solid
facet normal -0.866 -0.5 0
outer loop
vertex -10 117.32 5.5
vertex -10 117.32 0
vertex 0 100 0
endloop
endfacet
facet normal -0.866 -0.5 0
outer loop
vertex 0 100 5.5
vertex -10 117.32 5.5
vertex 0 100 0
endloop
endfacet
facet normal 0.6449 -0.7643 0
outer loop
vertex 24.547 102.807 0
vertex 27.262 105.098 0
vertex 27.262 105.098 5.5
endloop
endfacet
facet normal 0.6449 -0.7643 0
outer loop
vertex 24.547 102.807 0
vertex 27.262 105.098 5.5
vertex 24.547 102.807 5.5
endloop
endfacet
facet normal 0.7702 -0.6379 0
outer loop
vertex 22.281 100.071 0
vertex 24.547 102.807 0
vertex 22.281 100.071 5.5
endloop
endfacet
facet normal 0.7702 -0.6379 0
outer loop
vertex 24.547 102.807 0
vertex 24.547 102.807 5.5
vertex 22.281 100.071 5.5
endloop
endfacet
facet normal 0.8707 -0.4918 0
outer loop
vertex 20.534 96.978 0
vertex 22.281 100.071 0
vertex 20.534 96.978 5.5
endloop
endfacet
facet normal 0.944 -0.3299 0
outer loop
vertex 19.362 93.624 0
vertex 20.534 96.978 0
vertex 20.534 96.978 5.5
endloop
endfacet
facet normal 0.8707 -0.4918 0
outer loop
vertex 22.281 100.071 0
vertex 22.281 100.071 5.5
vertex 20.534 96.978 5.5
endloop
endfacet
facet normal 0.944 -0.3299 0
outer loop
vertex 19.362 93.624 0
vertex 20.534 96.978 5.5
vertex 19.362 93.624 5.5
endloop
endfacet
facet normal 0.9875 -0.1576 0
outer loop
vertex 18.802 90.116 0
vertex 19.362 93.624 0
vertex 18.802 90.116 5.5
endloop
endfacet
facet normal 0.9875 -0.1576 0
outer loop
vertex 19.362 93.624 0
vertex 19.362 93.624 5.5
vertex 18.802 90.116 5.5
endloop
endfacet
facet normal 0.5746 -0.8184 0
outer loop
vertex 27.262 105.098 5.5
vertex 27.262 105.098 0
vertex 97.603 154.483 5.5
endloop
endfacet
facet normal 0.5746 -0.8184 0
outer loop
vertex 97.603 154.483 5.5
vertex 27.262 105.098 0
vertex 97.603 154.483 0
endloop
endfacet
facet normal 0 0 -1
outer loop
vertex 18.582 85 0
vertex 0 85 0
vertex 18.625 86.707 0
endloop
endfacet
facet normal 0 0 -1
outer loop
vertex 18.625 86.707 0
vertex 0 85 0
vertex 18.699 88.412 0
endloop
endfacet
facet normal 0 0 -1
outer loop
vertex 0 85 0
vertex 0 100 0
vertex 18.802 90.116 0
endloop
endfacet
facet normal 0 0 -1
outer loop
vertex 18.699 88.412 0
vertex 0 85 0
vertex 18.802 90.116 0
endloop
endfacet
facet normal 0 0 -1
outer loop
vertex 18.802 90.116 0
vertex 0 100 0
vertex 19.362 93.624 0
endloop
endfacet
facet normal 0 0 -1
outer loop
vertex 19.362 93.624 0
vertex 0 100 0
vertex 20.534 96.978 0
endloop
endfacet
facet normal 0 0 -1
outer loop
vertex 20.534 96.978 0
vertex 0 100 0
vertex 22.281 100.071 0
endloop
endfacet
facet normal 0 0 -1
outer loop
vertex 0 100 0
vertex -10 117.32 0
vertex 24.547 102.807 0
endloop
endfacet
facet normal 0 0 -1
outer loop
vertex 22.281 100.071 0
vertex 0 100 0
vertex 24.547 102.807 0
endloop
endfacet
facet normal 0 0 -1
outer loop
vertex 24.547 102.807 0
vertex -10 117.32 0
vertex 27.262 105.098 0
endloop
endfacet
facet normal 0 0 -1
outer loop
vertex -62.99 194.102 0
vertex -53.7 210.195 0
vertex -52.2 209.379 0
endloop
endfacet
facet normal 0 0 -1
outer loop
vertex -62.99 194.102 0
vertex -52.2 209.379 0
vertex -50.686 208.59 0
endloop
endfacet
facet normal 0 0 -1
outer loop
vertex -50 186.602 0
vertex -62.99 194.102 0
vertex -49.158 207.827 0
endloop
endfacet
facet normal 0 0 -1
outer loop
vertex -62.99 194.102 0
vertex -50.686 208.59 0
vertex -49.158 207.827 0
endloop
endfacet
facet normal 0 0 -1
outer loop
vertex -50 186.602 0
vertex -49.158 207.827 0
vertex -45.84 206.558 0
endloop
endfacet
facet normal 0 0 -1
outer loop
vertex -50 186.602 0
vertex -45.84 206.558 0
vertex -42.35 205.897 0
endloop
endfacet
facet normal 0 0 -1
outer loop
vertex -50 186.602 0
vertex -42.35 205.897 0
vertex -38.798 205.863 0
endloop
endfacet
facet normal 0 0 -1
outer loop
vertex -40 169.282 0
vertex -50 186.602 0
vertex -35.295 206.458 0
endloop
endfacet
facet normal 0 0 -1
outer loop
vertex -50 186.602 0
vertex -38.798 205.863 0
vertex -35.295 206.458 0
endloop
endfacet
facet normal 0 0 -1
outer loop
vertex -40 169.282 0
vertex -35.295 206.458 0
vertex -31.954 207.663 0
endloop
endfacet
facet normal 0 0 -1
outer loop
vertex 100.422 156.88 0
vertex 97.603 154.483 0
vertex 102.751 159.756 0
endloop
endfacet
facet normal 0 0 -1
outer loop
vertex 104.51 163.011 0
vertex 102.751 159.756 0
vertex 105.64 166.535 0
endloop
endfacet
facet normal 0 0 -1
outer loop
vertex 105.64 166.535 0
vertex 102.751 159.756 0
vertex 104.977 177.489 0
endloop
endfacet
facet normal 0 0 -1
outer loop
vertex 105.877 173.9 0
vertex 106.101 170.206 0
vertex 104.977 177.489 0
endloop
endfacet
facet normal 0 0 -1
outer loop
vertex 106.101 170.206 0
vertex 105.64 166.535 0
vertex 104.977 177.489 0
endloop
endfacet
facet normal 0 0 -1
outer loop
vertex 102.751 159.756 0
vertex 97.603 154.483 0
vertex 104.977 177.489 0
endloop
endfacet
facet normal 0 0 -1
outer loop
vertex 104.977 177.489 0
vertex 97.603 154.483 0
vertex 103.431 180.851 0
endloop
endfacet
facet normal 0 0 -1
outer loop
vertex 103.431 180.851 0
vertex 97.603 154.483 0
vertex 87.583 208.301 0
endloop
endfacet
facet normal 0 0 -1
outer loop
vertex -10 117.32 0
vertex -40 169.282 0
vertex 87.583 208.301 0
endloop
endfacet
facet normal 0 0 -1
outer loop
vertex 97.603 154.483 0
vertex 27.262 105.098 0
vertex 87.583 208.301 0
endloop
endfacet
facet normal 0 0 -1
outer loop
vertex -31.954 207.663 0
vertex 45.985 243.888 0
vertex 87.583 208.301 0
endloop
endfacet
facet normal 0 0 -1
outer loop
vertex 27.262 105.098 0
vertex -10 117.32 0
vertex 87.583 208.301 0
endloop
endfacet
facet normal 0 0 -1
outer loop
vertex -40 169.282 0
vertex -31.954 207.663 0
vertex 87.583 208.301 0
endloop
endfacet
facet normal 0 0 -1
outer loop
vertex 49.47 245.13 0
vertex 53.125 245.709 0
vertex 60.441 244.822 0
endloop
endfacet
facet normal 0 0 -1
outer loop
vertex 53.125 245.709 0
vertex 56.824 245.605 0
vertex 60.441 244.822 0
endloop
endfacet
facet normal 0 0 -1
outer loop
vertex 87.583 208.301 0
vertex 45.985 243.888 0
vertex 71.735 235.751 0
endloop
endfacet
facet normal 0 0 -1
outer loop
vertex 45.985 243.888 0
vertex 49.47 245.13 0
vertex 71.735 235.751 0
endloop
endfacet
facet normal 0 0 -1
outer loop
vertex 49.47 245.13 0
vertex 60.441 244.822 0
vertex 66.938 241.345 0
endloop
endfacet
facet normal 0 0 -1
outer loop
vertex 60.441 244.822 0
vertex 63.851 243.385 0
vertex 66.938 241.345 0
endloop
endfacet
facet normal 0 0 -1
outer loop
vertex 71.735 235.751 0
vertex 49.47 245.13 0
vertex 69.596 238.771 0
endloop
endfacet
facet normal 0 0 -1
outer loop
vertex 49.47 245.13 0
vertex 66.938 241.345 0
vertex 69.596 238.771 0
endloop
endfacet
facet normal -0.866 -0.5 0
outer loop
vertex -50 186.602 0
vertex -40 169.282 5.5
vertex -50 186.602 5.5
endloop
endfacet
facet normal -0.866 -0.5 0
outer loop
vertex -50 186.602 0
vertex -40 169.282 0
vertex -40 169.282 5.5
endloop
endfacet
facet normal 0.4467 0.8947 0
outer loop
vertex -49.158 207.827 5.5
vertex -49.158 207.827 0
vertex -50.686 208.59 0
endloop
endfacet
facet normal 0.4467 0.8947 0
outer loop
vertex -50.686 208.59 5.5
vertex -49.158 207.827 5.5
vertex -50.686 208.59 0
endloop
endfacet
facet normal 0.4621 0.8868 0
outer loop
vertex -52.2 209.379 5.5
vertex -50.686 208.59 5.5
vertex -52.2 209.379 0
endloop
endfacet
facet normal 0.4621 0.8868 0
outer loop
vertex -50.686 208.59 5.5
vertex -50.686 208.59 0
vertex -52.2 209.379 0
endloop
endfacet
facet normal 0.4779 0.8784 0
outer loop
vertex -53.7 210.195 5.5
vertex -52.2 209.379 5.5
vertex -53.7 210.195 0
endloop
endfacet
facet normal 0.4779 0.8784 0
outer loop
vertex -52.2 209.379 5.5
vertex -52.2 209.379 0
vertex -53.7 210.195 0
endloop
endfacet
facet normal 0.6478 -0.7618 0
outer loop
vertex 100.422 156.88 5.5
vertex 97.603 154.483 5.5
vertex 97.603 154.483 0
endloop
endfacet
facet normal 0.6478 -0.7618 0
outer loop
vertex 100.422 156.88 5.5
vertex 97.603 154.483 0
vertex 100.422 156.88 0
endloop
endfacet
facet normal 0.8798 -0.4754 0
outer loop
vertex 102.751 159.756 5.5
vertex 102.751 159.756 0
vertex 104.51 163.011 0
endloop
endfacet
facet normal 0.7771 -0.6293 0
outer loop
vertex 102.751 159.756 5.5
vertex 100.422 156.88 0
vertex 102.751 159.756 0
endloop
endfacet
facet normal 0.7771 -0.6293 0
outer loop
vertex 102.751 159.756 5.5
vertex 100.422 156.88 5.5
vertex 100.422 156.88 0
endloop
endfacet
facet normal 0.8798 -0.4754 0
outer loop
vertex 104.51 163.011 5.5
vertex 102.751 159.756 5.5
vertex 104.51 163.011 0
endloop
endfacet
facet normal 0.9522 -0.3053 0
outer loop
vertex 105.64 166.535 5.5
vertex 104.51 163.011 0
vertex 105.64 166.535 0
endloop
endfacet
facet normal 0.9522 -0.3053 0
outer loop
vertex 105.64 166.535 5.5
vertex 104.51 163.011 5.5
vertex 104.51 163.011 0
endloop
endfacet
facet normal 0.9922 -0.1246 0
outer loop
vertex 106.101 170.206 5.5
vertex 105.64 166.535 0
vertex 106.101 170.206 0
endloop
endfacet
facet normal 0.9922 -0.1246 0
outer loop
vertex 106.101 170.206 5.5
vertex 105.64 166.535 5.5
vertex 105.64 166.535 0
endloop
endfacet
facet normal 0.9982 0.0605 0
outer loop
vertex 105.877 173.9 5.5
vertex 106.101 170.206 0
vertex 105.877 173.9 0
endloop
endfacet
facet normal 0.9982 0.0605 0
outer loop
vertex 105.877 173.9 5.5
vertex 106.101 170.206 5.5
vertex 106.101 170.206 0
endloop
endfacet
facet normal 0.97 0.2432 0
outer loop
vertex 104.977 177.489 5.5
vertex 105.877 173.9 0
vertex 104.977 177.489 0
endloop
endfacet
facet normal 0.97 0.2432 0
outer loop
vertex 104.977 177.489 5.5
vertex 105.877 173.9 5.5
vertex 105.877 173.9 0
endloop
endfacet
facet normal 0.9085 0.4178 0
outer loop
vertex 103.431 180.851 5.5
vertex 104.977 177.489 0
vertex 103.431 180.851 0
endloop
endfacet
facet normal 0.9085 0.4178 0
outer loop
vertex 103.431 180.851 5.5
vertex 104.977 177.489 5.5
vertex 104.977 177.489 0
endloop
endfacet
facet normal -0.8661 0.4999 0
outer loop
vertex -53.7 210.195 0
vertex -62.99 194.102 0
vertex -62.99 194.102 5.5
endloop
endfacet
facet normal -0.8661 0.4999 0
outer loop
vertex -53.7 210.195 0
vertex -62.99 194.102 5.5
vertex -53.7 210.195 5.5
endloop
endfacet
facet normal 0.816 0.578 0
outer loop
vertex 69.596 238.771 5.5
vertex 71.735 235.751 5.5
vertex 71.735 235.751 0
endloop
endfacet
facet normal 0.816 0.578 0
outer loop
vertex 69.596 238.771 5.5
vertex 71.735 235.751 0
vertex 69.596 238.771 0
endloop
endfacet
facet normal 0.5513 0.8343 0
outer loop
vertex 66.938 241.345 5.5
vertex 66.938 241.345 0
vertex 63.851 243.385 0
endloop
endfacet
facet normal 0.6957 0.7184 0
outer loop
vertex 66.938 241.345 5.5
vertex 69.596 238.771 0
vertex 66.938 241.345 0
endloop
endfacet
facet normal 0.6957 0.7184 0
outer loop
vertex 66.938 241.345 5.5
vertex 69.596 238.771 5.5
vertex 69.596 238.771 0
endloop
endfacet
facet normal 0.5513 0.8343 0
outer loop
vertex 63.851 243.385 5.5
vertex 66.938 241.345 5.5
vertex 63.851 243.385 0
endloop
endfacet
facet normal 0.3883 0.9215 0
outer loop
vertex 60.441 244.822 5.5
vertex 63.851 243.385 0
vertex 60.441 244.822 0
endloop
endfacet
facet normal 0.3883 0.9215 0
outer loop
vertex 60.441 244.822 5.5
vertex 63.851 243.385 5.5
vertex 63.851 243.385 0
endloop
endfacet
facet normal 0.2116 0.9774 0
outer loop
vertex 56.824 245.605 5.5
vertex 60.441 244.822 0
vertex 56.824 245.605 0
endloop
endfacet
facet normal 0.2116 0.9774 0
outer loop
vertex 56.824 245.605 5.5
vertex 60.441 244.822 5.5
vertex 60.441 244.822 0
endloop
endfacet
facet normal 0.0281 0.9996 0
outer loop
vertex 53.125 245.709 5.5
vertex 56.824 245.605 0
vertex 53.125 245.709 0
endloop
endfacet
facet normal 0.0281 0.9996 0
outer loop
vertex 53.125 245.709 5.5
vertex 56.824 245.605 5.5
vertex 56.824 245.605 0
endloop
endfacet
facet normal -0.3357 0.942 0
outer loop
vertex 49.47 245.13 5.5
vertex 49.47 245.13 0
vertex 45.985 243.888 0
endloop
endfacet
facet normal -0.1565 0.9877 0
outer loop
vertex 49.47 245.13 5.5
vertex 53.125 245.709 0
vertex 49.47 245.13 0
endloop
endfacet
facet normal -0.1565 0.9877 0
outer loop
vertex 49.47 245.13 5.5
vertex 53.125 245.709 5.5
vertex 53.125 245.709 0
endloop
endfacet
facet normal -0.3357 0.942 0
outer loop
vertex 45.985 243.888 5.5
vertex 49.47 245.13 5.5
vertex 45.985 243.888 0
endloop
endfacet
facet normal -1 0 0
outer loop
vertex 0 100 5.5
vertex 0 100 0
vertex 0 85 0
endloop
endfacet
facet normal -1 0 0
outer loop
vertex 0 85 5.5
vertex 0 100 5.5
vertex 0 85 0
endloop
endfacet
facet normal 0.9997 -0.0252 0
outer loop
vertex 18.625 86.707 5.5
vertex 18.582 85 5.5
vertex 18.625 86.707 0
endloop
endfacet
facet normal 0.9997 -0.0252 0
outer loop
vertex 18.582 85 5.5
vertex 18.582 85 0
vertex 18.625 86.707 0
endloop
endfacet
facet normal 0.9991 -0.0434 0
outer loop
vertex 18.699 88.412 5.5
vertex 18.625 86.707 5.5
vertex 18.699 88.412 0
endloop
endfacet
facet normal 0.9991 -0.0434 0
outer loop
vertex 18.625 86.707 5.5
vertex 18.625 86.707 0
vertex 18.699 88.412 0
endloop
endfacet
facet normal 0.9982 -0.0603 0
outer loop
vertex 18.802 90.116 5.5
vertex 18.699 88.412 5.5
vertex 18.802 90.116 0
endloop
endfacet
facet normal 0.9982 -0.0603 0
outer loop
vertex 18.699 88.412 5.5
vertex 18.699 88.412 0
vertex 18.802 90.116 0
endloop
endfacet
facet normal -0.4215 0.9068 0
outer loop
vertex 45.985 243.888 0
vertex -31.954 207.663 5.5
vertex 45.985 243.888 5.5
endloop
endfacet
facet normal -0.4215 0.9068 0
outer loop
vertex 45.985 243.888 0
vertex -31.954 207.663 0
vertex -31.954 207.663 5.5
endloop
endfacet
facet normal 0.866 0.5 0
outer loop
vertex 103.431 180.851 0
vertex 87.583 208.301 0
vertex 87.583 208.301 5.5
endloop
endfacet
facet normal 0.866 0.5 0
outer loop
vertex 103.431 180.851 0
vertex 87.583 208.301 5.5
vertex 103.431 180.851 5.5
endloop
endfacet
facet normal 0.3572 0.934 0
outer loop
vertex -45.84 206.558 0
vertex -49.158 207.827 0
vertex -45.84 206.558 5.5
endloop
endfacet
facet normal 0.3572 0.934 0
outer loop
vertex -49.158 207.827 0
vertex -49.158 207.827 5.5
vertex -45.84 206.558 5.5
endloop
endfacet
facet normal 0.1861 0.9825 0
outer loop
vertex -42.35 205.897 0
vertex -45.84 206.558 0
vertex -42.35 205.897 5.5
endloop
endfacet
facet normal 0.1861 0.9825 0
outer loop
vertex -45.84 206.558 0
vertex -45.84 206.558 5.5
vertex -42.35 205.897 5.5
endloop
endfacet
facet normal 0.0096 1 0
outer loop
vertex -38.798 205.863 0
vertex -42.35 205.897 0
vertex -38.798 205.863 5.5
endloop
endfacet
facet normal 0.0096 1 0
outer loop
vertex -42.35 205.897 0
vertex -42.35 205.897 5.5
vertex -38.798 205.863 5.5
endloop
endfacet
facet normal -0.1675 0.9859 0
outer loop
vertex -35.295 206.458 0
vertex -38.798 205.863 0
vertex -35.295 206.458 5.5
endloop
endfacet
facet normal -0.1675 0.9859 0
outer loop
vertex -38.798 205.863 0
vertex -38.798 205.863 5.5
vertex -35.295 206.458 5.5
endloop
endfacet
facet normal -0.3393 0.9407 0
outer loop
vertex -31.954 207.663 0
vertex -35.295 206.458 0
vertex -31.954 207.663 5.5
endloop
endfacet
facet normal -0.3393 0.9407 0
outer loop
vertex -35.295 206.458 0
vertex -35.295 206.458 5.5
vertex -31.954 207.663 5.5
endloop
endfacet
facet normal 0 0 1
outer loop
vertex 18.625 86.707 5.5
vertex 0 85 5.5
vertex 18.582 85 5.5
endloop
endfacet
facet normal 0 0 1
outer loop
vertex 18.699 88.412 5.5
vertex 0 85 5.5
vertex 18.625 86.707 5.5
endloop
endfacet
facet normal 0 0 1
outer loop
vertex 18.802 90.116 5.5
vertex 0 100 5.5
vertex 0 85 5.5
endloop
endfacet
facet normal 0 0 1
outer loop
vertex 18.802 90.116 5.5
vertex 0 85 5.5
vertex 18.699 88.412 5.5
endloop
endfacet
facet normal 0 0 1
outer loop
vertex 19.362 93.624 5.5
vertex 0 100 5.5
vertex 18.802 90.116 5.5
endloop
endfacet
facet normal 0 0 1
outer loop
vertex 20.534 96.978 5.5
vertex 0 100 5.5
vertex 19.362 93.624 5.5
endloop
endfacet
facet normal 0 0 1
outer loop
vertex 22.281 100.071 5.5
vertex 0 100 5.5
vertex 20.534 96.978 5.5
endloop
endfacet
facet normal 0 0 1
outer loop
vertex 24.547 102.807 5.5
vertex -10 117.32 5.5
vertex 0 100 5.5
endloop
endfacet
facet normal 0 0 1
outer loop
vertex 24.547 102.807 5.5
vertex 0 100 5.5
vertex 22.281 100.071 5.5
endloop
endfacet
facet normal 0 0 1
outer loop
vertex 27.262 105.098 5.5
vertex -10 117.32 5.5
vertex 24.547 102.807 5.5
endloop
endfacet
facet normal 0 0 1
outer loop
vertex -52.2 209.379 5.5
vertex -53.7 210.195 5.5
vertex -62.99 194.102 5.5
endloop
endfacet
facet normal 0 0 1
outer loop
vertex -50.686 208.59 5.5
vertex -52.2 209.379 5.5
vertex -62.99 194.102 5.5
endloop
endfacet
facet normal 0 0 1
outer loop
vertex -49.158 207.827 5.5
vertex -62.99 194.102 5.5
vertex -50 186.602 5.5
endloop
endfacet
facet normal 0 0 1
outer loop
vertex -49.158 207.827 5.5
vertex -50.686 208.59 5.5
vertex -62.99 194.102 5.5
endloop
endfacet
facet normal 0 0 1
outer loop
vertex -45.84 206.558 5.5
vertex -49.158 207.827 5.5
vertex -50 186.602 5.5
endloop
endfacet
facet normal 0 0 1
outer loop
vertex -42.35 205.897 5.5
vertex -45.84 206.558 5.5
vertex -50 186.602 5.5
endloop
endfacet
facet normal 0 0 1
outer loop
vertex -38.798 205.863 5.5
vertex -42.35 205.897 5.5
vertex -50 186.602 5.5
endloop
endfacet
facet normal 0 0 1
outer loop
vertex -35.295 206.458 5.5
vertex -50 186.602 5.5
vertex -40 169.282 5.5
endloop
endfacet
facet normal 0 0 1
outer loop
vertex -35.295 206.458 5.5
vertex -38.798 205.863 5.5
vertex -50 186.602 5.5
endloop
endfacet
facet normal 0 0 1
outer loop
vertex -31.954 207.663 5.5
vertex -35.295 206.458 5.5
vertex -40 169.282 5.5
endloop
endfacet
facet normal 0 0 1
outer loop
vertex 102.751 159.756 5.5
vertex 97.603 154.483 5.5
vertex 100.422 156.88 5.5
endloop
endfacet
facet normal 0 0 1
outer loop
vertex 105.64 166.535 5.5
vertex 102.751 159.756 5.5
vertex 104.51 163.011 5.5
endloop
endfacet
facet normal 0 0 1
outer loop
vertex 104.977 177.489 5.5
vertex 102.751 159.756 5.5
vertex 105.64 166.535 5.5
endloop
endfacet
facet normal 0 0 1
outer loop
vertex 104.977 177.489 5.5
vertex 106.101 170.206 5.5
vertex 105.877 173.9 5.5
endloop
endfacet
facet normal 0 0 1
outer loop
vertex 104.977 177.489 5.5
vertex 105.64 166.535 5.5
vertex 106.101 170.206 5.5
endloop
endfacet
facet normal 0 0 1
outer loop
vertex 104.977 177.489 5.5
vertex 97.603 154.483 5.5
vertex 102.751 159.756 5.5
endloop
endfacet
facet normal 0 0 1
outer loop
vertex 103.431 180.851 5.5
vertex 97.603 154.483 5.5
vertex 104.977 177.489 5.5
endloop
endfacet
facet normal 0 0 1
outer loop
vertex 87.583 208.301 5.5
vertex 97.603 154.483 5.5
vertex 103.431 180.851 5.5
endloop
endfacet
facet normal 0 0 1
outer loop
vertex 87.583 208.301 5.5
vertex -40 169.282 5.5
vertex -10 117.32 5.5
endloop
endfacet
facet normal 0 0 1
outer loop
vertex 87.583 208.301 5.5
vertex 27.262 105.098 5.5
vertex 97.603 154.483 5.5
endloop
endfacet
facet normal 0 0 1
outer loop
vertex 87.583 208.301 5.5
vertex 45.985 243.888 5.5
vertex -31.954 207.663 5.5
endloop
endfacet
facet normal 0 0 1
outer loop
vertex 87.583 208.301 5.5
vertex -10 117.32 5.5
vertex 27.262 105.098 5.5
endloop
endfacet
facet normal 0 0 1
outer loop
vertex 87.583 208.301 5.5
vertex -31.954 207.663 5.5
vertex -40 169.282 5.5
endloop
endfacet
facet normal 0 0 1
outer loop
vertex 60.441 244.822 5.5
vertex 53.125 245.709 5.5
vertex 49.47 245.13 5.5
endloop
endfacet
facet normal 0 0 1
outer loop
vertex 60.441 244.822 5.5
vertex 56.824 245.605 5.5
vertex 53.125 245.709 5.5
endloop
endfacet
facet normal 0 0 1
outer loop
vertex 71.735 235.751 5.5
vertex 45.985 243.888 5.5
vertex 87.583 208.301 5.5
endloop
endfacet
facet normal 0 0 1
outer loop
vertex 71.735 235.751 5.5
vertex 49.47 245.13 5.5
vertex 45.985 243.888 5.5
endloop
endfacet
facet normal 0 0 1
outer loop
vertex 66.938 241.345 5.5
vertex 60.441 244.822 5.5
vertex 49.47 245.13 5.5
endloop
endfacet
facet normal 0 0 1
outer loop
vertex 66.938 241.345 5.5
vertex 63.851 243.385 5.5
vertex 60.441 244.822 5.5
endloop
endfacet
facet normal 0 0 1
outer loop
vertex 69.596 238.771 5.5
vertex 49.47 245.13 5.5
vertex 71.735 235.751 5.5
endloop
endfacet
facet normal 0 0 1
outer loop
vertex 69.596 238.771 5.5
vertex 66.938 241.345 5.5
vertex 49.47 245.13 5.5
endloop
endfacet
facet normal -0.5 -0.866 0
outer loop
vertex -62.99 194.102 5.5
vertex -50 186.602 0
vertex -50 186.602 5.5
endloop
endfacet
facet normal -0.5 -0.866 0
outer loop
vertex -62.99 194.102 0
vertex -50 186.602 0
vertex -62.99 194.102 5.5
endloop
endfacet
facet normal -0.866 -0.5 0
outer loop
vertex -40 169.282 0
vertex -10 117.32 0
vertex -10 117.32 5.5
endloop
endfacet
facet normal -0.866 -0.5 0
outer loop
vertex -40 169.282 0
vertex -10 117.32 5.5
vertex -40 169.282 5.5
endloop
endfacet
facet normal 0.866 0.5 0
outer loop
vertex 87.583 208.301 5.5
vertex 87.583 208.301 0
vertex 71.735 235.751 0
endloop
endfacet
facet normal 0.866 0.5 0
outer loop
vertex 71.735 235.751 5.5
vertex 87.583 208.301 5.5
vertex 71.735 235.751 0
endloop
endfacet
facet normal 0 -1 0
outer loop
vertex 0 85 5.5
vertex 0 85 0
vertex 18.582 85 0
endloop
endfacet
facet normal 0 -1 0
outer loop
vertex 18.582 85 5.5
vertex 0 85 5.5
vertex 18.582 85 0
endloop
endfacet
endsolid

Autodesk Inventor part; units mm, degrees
ref_plane "YZ Plane" through (0, 0, 0) normal (1, 0, 0) x (0, 1, 0)
ref_plane "XZ Plane" through (0, 0, 0) normal (0, 1, 0) x (-1, 0, 0)
ref_plane "XY Plane" through (0, 0, 0) normal (0, 0, 1) x (1, 0, 0)
sketch "Sketch1" plane through (0, 0, 0) normal (0, 0, 1) x (1, 0, 0)
  arc A0 (20, 100) -> (18.5818, 85) centre (115.8042, 83.3748) ccw
  arc A1 (-53.6995, 210.1948) -> (-40, 203.923) centre (-6.4957, 295.2045) ccw
  line L0 (-10, 117.3205) -> (0, 100)
  line L1 (-40, 169.282) -> (-50, 186.6025)
  line L2 (0, 100) -> (0, 85)
  line L3 (0, 85) -> (18.5818, 85)
  line L4 (-10, 117.3205) -> (-40, 169.282)
  line L5 (-50, 186.6025) -> (-62.9904, 194.1025)
  line L6 (-62.9904, 194.1025) -> (-53.6995, 210.1948)
  line L7 (87.5833, 208.3013) -> (62.5833, 251.6025)
  line L8 (87.5833, 208.3013) -> (112.5833, 165)
  line L9 (-40, 203.923) -> (62.5833, 251.6025)
  line L10 (20, 100) -> (112.5833, 165)
  dimension "d14" = 15
  dimension "d47" = 15
  dimension "d49" = 50
  dimension "d50" = 50
extrude "Extrusion4" add sketch "Sketch1" along normal blind 5.5
fillet "Fillet1" radius 20 2 edges at (112.5833, 165, 2.75) (62.5833, 251.6025, 2.75)
fillet "Fillet2" radius 20 2 edges at (20, 100, 2.75) (-40, 203.923, 2.75)
properties part number "brazos"
